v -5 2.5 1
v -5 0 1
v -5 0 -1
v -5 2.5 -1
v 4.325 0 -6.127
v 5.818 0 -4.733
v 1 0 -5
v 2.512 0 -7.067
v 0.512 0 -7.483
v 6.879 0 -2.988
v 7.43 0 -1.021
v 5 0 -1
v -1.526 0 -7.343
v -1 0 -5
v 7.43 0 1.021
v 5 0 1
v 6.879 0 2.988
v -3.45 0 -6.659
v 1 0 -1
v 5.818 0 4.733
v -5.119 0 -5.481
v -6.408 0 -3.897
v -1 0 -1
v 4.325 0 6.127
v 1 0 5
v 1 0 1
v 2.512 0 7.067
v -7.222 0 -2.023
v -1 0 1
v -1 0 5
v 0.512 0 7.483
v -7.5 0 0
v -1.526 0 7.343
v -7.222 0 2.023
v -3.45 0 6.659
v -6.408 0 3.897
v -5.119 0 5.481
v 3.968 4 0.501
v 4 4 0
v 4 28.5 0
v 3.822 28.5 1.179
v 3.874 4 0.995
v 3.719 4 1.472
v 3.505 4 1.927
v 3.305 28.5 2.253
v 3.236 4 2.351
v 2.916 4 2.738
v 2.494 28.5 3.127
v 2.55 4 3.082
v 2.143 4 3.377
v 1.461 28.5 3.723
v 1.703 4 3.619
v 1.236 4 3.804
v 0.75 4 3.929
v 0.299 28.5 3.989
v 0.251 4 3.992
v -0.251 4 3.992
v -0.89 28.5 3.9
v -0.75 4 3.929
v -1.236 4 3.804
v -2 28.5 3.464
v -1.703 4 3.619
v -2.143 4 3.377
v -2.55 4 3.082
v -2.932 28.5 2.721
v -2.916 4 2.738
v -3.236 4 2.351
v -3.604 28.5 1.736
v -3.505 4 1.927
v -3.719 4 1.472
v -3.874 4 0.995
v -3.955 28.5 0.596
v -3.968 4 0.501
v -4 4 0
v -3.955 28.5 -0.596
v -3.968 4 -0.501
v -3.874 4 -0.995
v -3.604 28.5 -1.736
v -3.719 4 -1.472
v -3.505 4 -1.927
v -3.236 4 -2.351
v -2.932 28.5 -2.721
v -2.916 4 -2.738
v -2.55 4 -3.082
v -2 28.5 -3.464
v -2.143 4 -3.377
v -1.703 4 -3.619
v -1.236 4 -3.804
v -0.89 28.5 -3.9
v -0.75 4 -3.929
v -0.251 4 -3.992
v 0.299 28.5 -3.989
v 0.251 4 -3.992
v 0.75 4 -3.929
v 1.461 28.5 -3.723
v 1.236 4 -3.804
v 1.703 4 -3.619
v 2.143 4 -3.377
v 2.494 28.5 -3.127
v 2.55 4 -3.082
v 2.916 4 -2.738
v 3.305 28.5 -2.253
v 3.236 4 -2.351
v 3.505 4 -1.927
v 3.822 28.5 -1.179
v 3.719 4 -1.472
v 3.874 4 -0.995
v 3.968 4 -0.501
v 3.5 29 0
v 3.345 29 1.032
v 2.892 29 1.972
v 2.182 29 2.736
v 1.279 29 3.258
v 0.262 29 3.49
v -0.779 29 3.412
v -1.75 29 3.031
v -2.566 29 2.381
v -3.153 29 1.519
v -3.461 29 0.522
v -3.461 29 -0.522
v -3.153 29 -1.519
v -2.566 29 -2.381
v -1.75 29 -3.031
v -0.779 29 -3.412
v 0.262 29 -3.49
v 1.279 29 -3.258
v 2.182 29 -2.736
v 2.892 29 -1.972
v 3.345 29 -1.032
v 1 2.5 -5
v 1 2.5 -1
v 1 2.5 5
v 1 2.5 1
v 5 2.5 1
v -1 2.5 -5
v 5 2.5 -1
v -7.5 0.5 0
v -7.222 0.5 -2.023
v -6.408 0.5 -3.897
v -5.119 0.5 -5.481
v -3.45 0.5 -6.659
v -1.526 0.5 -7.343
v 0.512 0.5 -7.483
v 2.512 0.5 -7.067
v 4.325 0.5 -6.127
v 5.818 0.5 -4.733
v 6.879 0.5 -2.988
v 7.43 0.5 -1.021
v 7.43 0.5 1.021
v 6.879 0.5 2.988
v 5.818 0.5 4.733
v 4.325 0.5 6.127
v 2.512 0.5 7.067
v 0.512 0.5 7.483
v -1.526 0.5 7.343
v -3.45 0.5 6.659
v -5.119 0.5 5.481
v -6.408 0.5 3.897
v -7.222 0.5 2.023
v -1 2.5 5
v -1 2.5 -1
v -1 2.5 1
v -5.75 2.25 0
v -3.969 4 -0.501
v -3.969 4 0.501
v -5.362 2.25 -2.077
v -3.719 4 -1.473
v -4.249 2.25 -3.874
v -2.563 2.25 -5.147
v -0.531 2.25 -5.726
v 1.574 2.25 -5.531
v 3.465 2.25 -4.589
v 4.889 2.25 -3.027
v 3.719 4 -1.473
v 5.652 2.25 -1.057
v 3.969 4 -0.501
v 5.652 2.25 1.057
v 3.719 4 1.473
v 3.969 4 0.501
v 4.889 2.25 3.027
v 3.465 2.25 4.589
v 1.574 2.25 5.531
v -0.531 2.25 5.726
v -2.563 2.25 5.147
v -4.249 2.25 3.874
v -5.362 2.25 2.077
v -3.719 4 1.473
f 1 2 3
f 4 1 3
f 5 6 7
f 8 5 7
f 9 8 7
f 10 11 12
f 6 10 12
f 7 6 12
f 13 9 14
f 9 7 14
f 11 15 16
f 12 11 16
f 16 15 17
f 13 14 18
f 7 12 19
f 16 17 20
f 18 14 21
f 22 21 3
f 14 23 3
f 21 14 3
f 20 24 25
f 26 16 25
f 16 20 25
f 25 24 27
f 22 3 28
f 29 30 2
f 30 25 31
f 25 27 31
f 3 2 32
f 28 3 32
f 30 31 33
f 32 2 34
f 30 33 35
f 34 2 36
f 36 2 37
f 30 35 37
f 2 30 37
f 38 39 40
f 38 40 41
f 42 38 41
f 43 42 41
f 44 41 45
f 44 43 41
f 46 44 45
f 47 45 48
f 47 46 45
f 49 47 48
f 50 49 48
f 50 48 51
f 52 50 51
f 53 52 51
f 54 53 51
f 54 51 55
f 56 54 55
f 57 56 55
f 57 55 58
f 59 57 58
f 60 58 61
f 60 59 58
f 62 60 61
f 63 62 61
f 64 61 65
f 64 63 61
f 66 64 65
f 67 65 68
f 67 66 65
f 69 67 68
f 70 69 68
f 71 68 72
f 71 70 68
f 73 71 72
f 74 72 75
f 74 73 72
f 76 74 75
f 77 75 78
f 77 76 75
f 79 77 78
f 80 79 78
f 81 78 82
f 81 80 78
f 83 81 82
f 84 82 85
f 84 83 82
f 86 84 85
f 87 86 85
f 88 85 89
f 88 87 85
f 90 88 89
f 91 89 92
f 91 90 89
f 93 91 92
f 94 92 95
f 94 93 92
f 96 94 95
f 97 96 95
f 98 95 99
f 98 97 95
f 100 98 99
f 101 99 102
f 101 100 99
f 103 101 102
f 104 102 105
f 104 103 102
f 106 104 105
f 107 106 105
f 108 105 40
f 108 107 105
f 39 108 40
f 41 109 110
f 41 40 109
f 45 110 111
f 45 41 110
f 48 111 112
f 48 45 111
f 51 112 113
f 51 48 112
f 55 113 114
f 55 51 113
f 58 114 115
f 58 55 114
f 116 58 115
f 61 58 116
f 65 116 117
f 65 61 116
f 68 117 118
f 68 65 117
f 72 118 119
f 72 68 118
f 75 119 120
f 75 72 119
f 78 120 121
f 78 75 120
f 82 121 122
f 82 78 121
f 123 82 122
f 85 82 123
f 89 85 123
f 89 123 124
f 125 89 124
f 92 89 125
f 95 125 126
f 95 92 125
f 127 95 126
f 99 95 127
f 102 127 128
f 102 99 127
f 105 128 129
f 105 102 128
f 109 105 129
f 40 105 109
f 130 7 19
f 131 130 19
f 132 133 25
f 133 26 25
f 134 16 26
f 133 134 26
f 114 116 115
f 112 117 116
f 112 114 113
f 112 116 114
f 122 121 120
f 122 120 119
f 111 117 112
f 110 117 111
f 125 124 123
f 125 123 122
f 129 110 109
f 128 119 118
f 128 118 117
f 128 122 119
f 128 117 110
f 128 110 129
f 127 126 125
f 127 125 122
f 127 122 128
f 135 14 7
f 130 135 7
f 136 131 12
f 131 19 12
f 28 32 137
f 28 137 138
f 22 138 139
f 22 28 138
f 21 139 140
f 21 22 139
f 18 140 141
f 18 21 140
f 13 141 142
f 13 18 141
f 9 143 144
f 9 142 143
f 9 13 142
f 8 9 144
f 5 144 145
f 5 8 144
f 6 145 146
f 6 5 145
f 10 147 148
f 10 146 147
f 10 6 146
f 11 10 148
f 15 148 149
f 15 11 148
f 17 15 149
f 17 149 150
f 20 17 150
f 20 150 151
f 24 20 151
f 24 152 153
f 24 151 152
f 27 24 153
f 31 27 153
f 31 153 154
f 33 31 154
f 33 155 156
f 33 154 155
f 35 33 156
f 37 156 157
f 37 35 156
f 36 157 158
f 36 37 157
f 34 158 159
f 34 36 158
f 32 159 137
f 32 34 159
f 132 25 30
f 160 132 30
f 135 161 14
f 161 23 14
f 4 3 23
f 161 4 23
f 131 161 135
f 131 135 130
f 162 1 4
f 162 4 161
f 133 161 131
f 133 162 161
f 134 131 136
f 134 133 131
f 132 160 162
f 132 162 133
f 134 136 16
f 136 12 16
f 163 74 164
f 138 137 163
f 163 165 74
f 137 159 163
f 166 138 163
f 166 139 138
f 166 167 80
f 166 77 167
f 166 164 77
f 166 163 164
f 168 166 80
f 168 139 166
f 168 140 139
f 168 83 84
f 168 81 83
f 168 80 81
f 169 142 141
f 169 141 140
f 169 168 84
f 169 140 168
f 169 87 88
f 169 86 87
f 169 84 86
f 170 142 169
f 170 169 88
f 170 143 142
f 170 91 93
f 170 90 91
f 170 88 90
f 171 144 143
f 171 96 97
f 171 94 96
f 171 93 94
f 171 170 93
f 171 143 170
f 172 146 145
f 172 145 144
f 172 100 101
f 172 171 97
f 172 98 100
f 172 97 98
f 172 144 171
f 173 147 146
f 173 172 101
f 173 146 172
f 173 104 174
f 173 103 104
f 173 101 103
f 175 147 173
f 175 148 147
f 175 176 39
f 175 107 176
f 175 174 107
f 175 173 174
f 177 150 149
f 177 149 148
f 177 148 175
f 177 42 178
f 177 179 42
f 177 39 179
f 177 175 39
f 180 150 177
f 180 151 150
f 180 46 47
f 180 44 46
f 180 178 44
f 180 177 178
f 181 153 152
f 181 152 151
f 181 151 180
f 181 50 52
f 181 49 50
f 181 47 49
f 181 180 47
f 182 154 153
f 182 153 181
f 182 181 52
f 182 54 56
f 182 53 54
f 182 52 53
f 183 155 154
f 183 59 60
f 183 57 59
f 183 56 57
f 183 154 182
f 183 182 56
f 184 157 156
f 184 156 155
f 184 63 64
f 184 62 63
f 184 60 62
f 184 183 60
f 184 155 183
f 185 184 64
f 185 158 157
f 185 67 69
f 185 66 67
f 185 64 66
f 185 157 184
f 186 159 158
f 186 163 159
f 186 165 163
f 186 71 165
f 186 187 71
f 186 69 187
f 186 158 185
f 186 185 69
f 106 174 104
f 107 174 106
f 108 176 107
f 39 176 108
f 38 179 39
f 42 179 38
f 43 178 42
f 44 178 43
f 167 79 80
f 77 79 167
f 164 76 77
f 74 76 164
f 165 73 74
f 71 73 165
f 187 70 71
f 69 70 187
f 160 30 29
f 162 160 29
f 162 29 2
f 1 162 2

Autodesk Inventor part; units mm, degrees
ref_plane "YZ Plane" through (0, 0, 0) normal (1, 0, 0) x (0, 1, 0)
ref_plane "XZ Plane" through (0, 0, 0) normal (0, 1, 0) x (-1, 0, 0)
ref_plane "XY Plane" through (0, 0, 0) normal (0, 0, 1) x (1, 0, 0)
sketch "Эскиз1" plane through (0, 0, 0) normal (0, 1, 0) x (-1, 0, 0)
  circle A0 centre (0, 0) radius 7.5
  dimension "d0" = 15
extrude "Выдавливание1" add sketch "Эскиз1" along normal blind 4
sketch "Эскиз2" plane through (0, 4, 0) normal (0, 1, 0) x (1, 0, 0)
  circle A0 centre (0, 0) radius 4
  dimension "d3" = 8
extrude "Выдавливание2" add sketch "Эскиз2" along normal blind 25
chamfer "Фаска1" distance 3.5 angle 45 1 edges at (7.5, 4, 0)
thread "Резьба1" size "M8x1.25" class "6g" standard "ANSI Metric M Profile" full length
chamfer "Фаска2" distance 0.5 angle 45 1 edges at (-4, 29, 0)
sketch "Эскиз3" plane through (0, 0, 0) normal (0, -1, 0) x (1, 0, 0)
  line L0 (-5, -1) -> (5, -1)
  line L1 (5, -1) -> (5, 1)
  line L2 (5, 1) -> (-5, 1)
  line L3 (-5, 1) -> (-5, -1)
  line L4 (-5, -1) -> (5, 1) construction
  line L5 (5, -1) -> (-5, 1) construction
  line L6 (-1, -5) -> (1, -5)
  line L7 (1, -5) -> (1, 5)
  line L8 (1, 5) -> (-1, 5)
  line L9 (-1, 5) -> (-1, -5)
  line L10 (-1, -5) -> (1, 5) construction
  line L11 (1, -5) -> (-1, 5) construction
  point P0 (0, 0)
  dimension "d14" = 10
  dimension "d15" = 2
  dimension "d16" = 10
  dimension "d17" = 2
extrude "Выдавливание3" cut sketch "Эскиз3" against normal blind 2.5
properties part number "Винт М8х25 с потайной головкой" material "Сталь"
